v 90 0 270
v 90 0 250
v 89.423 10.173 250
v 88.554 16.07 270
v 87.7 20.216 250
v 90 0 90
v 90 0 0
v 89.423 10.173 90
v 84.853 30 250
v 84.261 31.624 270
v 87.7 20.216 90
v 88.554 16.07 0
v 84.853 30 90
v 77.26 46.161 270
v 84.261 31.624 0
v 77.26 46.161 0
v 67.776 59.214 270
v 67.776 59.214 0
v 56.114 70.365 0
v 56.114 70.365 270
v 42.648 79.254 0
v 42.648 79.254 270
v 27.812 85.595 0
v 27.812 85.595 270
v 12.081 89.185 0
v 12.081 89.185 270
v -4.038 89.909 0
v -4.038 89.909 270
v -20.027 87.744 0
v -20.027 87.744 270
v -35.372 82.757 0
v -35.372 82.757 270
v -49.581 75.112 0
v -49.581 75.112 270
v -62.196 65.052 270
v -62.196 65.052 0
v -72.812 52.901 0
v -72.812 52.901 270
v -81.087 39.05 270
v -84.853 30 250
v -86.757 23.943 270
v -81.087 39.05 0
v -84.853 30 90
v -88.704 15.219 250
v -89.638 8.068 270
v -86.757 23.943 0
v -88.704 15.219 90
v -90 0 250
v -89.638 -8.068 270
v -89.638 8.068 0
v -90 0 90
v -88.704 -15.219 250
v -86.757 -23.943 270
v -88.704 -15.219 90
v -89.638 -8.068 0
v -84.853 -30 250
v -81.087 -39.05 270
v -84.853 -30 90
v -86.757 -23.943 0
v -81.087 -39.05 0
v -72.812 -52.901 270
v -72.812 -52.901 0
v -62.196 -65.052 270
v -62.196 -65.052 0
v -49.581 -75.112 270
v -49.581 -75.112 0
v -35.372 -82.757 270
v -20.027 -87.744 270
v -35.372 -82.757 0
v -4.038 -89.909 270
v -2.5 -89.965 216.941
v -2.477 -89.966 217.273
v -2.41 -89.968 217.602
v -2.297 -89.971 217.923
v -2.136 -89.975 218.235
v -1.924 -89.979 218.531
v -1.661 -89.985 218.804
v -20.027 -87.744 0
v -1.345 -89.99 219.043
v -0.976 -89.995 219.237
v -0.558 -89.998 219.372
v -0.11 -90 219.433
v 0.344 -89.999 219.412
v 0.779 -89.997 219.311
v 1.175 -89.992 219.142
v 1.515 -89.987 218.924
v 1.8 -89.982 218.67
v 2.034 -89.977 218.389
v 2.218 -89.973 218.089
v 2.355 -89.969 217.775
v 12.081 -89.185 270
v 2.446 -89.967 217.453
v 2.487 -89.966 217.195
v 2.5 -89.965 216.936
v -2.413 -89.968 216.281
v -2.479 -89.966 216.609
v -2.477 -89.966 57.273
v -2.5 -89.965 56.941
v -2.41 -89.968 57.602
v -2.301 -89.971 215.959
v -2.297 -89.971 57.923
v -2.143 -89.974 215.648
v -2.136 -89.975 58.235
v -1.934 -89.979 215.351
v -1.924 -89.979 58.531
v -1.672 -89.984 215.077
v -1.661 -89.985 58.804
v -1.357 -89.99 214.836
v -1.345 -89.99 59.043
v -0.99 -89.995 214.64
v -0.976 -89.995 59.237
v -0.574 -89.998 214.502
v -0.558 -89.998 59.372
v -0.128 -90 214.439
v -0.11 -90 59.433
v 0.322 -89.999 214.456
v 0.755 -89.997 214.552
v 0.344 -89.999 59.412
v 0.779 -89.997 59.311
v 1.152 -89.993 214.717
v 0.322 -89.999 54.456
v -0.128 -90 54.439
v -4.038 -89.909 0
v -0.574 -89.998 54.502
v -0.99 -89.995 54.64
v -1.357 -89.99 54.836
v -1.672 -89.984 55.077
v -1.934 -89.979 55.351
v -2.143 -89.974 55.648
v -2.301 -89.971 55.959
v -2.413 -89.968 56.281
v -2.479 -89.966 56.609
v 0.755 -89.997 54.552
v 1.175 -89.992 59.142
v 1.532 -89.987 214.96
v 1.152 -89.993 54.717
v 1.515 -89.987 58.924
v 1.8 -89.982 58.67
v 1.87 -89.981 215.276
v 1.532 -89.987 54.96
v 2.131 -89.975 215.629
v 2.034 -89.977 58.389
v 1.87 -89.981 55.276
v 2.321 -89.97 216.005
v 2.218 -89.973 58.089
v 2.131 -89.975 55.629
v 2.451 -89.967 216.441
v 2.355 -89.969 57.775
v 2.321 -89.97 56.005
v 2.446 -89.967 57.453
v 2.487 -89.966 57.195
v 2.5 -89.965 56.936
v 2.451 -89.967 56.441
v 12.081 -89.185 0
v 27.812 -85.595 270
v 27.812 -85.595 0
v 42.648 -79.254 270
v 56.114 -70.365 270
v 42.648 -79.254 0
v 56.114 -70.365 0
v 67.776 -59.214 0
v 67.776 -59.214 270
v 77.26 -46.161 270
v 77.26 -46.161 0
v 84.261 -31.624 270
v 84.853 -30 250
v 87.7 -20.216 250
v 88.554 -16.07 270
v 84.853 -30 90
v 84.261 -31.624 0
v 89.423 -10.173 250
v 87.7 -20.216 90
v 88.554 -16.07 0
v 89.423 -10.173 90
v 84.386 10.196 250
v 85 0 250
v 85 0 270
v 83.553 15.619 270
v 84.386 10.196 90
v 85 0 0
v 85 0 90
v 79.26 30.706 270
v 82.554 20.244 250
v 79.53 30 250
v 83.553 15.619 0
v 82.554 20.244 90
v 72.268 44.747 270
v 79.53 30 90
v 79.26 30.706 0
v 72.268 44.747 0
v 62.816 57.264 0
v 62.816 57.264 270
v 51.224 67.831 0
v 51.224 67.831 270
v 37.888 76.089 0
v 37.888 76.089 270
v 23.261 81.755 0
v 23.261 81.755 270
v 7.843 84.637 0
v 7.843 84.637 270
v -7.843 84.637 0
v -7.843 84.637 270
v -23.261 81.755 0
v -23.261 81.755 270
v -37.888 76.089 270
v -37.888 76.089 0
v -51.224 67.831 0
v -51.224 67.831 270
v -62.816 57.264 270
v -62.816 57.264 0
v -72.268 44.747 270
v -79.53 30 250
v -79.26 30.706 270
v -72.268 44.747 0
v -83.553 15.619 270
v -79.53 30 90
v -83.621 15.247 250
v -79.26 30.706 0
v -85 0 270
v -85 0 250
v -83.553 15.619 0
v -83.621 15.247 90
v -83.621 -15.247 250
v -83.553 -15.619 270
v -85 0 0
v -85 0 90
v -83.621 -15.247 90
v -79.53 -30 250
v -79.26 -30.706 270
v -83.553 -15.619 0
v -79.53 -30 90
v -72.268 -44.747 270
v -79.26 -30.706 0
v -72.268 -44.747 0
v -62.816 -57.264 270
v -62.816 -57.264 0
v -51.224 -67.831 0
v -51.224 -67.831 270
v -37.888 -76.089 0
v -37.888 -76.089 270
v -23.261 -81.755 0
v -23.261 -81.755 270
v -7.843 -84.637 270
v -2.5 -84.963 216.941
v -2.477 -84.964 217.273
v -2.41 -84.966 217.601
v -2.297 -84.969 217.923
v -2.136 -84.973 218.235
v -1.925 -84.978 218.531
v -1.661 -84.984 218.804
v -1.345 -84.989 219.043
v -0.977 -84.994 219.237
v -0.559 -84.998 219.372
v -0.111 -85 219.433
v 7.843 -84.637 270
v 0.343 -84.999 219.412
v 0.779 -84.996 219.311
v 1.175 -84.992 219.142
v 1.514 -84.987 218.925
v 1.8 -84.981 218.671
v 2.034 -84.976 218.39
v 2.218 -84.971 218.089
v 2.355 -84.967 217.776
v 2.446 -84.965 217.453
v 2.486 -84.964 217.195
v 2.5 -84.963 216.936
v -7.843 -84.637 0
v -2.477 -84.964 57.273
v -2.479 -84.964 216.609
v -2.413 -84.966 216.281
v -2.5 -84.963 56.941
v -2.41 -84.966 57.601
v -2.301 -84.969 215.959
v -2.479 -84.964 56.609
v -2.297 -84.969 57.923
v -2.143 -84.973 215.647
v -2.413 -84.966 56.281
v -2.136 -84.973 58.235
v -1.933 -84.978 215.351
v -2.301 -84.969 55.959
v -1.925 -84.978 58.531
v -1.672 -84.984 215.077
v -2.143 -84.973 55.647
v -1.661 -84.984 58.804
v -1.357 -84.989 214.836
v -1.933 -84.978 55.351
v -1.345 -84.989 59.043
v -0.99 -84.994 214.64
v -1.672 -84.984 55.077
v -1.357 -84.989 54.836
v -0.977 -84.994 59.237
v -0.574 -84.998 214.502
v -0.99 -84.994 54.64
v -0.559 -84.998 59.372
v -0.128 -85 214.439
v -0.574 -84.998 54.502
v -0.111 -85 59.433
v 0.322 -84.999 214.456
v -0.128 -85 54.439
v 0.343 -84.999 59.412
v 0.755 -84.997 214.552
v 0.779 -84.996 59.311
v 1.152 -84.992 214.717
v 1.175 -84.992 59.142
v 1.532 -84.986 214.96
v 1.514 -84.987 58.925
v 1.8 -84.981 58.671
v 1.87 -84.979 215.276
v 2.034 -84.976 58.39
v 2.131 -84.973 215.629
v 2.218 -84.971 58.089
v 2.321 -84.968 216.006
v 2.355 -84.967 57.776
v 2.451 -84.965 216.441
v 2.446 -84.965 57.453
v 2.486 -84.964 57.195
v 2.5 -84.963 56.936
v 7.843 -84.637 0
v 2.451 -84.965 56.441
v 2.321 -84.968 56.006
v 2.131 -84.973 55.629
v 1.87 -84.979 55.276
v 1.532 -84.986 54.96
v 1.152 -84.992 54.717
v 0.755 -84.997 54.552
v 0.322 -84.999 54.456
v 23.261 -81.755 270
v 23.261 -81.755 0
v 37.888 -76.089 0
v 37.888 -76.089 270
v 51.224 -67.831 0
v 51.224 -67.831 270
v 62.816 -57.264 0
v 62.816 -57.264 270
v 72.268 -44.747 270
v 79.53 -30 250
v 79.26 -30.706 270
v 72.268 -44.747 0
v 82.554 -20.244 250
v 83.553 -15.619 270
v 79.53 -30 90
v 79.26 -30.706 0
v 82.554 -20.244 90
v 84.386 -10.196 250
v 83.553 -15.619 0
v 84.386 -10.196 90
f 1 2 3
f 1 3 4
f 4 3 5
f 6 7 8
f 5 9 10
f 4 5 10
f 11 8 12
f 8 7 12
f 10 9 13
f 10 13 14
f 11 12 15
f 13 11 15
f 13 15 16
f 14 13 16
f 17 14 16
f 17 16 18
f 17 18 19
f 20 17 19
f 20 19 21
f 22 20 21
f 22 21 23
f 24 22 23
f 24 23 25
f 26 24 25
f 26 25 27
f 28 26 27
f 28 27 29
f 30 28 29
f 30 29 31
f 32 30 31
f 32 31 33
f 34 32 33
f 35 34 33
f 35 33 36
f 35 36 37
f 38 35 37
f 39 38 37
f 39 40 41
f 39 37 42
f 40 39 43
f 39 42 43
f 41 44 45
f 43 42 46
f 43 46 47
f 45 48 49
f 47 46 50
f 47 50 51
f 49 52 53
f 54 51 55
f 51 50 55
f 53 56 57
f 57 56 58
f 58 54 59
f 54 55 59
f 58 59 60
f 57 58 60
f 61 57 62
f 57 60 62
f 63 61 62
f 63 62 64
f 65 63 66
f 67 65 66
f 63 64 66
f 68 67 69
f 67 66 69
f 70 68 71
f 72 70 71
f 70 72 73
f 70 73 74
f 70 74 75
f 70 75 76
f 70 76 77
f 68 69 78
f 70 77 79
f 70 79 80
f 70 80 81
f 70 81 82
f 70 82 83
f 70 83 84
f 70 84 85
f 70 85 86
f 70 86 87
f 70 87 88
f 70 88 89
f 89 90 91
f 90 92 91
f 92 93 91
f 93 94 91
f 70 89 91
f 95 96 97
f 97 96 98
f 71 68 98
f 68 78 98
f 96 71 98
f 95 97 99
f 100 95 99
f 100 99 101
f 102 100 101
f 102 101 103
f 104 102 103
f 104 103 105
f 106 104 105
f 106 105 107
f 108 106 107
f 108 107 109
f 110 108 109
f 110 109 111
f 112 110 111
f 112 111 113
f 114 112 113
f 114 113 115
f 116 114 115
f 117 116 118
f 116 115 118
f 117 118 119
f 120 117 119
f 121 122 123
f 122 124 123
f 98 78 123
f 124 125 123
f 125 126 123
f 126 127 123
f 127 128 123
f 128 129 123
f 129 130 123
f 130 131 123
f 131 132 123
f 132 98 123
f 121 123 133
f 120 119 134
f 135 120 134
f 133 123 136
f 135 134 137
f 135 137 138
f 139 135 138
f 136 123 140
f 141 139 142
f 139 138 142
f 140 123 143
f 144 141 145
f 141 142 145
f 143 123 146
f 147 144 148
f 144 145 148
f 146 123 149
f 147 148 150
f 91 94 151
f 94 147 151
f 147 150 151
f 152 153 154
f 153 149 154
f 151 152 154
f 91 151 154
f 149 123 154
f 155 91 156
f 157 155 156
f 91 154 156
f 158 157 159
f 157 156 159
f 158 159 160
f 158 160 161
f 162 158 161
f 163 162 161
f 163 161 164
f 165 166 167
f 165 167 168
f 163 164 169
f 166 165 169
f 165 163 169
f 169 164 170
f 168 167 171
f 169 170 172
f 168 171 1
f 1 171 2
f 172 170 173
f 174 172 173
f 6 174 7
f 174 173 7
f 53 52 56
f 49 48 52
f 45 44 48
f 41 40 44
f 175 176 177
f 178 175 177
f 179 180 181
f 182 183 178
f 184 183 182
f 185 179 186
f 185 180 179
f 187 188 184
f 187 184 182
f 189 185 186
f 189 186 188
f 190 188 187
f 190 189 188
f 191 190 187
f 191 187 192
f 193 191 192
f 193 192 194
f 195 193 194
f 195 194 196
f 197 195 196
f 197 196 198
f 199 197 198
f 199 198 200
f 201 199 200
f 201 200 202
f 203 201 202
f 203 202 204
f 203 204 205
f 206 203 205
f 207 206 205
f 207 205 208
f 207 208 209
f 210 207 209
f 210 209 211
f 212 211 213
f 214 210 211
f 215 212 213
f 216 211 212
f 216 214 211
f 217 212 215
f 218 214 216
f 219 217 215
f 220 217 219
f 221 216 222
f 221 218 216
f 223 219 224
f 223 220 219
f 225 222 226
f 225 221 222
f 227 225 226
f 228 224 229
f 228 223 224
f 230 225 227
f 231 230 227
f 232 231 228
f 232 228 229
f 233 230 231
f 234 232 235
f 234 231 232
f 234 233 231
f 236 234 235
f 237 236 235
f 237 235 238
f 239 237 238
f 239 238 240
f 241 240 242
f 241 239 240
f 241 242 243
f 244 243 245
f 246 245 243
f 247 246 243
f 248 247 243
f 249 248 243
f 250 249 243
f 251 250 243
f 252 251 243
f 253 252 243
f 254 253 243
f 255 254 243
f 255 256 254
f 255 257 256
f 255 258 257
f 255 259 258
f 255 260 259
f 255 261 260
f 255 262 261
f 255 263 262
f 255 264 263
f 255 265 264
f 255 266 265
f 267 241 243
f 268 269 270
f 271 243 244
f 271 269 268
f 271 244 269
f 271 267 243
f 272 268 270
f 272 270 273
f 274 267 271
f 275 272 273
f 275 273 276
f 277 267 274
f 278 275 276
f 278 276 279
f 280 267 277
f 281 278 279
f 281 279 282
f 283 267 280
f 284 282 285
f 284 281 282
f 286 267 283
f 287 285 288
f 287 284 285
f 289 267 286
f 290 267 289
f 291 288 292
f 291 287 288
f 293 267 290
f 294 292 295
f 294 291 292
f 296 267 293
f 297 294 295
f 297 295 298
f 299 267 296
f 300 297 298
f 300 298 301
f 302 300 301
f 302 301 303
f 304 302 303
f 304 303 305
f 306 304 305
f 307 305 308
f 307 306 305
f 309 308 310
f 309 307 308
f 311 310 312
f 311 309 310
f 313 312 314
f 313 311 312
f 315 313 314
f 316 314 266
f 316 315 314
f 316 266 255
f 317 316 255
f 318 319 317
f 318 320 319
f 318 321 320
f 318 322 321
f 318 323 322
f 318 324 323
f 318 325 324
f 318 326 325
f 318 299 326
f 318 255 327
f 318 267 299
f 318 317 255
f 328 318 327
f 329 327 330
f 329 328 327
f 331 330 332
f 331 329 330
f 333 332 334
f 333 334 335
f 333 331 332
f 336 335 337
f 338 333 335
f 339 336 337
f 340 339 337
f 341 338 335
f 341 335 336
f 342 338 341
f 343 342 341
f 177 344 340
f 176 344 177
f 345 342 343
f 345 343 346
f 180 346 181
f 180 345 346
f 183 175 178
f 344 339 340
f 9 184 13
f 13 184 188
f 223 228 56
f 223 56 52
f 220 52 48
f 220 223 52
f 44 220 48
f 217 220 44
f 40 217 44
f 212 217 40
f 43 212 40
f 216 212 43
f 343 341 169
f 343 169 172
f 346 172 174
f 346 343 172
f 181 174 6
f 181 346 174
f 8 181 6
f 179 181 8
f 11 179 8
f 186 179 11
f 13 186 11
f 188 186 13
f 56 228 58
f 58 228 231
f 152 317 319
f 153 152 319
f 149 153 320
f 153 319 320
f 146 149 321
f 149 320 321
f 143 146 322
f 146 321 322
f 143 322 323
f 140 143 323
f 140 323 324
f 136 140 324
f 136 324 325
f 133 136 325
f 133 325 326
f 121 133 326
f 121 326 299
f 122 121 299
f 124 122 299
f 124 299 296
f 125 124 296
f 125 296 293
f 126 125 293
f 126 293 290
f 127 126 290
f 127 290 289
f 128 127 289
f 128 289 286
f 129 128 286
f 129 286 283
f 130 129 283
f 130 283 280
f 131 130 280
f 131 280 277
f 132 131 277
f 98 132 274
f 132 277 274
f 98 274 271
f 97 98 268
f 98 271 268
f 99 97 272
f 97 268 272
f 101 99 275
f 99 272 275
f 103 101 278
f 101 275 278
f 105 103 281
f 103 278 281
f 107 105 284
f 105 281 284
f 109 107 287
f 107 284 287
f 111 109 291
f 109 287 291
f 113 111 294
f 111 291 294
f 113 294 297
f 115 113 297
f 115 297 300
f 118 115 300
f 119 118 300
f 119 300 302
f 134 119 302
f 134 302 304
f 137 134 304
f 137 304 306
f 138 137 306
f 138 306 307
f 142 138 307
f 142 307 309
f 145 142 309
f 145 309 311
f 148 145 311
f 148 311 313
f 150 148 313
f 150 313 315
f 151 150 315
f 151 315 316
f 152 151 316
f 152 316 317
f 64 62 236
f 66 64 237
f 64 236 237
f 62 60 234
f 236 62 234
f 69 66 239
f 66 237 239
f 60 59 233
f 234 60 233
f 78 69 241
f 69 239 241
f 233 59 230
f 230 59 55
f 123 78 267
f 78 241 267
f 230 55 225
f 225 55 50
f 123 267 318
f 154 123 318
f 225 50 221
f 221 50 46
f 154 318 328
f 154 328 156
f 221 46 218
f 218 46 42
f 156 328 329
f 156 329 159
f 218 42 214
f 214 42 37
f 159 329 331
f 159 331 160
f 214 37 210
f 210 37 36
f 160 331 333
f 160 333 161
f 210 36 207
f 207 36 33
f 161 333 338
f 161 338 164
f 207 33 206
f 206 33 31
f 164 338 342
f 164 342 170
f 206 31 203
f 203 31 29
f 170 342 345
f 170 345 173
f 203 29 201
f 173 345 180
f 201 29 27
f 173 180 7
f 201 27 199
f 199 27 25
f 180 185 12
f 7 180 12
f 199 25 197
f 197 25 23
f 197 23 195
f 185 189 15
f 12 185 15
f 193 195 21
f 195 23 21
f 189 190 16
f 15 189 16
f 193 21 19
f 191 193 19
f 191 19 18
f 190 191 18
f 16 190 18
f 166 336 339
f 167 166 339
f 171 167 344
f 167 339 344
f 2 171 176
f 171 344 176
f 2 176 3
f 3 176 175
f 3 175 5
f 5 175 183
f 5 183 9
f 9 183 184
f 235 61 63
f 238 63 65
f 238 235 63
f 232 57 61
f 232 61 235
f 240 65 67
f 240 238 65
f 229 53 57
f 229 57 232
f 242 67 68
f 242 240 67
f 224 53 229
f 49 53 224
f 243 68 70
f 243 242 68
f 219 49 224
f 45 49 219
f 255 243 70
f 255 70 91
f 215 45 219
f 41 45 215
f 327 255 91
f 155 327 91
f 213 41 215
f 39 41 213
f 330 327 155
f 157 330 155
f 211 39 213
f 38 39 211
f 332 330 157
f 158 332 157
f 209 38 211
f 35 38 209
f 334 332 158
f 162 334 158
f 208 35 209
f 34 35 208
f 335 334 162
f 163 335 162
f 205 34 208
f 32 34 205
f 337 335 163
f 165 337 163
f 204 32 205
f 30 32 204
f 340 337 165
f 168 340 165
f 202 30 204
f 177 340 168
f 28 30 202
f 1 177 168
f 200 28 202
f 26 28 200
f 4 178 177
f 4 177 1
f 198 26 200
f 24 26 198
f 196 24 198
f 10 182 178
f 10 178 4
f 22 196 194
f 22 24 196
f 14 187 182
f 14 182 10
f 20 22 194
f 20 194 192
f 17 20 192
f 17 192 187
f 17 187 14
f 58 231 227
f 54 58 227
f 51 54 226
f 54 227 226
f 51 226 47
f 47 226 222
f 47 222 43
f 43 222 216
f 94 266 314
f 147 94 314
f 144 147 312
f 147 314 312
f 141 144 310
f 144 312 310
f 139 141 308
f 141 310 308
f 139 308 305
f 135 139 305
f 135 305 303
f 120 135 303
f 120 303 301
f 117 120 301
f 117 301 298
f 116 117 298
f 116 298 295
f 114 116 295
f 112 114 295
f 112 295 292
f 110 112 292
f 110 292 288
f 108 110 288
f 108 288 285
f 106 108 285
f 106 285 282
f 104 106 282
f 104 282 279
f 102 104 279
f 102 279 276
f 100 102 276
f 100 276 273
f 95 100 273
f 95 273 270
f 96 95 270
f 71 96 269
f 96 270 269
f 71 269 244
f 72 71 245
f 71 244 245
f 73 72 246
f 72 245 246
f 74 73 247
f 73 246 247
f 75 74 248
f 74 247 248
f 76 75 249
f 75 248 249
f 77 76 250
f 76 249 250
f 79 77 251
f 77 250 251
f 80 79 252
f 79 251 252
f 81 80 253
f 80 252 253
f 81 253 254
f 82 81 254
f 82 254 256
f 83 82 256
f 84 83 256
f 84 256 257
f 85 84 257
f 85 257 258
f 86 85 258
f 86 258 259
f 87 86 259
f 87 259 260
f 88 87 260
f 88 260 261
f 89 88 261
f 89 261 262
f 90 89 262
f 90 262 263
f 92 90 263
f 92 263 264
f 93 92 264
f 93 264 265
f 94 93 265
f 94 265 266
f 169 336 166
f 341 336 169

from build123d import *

# Parameters (mm, degrees)
SKETCH1_R               = 90
SKETCH1_R_2             = 85
BOSS_EXTRUDE1_DEPTH     = 270
SKETCH2_W               = 160
SKETCH2_H               = 60
CUT_EXTRUDE1_DEPTH      = 81
CUT_EXTRUDE1_DEPTH_BACK = 101
SKETCH3_R               = 2.5
CUT_EXTRUDE2_DEPTH      = 200


with BuildPart() as part:
    # Sketch1 → Boss-Extrude1 (new body)
    with BuildSketch(Plane.XY):
        Circle(SKETCH1_R)
        Circle(SKETCH1_R_2, mode=Mode.SUBTRACT)
    extrude(amount=BOSS_EXTRUDE1_DEPTH)

    # Sketch2 → Cut-Extrude1 (cut, two sides)
    with BuildSketch(Plane(origin=(10, 0, 0), x_dir=(0, 0, -1), z_dir=(1, 0, 0))) as cut_extrude1_sk:
        with Locations((-170, 0)):
            Rectangle(SKETCH2_W, SKETCH2_H)
    extrude(amount=CUT_EXTRUDE1_DEPTH, mode=Mode.SUBTRACT)
    extrude(cut_extrude1_sk.sketch, amount=-CUT_EXTRUDE1_DEPTH_BACK, mode=Mode.SUBTRACT)

    # Sketch3 → Cut-Extrude2 (cut)
    with BuildSketch(Plane(origin=(0, 10, 0), x_dir=(1, 0, 0), z_dir=(0, 1, 0))):
        with Locations((0, -216.93551415)):
            Circle(SKETCH3_R)
        with Locations((0, -56.93551415)):
            Circle(SKETCH3_R)
    extrude(amount=-CUT_EXTRUDE2_DEPTH, mode=Mode.SUBTRACT)


solid = part.part
